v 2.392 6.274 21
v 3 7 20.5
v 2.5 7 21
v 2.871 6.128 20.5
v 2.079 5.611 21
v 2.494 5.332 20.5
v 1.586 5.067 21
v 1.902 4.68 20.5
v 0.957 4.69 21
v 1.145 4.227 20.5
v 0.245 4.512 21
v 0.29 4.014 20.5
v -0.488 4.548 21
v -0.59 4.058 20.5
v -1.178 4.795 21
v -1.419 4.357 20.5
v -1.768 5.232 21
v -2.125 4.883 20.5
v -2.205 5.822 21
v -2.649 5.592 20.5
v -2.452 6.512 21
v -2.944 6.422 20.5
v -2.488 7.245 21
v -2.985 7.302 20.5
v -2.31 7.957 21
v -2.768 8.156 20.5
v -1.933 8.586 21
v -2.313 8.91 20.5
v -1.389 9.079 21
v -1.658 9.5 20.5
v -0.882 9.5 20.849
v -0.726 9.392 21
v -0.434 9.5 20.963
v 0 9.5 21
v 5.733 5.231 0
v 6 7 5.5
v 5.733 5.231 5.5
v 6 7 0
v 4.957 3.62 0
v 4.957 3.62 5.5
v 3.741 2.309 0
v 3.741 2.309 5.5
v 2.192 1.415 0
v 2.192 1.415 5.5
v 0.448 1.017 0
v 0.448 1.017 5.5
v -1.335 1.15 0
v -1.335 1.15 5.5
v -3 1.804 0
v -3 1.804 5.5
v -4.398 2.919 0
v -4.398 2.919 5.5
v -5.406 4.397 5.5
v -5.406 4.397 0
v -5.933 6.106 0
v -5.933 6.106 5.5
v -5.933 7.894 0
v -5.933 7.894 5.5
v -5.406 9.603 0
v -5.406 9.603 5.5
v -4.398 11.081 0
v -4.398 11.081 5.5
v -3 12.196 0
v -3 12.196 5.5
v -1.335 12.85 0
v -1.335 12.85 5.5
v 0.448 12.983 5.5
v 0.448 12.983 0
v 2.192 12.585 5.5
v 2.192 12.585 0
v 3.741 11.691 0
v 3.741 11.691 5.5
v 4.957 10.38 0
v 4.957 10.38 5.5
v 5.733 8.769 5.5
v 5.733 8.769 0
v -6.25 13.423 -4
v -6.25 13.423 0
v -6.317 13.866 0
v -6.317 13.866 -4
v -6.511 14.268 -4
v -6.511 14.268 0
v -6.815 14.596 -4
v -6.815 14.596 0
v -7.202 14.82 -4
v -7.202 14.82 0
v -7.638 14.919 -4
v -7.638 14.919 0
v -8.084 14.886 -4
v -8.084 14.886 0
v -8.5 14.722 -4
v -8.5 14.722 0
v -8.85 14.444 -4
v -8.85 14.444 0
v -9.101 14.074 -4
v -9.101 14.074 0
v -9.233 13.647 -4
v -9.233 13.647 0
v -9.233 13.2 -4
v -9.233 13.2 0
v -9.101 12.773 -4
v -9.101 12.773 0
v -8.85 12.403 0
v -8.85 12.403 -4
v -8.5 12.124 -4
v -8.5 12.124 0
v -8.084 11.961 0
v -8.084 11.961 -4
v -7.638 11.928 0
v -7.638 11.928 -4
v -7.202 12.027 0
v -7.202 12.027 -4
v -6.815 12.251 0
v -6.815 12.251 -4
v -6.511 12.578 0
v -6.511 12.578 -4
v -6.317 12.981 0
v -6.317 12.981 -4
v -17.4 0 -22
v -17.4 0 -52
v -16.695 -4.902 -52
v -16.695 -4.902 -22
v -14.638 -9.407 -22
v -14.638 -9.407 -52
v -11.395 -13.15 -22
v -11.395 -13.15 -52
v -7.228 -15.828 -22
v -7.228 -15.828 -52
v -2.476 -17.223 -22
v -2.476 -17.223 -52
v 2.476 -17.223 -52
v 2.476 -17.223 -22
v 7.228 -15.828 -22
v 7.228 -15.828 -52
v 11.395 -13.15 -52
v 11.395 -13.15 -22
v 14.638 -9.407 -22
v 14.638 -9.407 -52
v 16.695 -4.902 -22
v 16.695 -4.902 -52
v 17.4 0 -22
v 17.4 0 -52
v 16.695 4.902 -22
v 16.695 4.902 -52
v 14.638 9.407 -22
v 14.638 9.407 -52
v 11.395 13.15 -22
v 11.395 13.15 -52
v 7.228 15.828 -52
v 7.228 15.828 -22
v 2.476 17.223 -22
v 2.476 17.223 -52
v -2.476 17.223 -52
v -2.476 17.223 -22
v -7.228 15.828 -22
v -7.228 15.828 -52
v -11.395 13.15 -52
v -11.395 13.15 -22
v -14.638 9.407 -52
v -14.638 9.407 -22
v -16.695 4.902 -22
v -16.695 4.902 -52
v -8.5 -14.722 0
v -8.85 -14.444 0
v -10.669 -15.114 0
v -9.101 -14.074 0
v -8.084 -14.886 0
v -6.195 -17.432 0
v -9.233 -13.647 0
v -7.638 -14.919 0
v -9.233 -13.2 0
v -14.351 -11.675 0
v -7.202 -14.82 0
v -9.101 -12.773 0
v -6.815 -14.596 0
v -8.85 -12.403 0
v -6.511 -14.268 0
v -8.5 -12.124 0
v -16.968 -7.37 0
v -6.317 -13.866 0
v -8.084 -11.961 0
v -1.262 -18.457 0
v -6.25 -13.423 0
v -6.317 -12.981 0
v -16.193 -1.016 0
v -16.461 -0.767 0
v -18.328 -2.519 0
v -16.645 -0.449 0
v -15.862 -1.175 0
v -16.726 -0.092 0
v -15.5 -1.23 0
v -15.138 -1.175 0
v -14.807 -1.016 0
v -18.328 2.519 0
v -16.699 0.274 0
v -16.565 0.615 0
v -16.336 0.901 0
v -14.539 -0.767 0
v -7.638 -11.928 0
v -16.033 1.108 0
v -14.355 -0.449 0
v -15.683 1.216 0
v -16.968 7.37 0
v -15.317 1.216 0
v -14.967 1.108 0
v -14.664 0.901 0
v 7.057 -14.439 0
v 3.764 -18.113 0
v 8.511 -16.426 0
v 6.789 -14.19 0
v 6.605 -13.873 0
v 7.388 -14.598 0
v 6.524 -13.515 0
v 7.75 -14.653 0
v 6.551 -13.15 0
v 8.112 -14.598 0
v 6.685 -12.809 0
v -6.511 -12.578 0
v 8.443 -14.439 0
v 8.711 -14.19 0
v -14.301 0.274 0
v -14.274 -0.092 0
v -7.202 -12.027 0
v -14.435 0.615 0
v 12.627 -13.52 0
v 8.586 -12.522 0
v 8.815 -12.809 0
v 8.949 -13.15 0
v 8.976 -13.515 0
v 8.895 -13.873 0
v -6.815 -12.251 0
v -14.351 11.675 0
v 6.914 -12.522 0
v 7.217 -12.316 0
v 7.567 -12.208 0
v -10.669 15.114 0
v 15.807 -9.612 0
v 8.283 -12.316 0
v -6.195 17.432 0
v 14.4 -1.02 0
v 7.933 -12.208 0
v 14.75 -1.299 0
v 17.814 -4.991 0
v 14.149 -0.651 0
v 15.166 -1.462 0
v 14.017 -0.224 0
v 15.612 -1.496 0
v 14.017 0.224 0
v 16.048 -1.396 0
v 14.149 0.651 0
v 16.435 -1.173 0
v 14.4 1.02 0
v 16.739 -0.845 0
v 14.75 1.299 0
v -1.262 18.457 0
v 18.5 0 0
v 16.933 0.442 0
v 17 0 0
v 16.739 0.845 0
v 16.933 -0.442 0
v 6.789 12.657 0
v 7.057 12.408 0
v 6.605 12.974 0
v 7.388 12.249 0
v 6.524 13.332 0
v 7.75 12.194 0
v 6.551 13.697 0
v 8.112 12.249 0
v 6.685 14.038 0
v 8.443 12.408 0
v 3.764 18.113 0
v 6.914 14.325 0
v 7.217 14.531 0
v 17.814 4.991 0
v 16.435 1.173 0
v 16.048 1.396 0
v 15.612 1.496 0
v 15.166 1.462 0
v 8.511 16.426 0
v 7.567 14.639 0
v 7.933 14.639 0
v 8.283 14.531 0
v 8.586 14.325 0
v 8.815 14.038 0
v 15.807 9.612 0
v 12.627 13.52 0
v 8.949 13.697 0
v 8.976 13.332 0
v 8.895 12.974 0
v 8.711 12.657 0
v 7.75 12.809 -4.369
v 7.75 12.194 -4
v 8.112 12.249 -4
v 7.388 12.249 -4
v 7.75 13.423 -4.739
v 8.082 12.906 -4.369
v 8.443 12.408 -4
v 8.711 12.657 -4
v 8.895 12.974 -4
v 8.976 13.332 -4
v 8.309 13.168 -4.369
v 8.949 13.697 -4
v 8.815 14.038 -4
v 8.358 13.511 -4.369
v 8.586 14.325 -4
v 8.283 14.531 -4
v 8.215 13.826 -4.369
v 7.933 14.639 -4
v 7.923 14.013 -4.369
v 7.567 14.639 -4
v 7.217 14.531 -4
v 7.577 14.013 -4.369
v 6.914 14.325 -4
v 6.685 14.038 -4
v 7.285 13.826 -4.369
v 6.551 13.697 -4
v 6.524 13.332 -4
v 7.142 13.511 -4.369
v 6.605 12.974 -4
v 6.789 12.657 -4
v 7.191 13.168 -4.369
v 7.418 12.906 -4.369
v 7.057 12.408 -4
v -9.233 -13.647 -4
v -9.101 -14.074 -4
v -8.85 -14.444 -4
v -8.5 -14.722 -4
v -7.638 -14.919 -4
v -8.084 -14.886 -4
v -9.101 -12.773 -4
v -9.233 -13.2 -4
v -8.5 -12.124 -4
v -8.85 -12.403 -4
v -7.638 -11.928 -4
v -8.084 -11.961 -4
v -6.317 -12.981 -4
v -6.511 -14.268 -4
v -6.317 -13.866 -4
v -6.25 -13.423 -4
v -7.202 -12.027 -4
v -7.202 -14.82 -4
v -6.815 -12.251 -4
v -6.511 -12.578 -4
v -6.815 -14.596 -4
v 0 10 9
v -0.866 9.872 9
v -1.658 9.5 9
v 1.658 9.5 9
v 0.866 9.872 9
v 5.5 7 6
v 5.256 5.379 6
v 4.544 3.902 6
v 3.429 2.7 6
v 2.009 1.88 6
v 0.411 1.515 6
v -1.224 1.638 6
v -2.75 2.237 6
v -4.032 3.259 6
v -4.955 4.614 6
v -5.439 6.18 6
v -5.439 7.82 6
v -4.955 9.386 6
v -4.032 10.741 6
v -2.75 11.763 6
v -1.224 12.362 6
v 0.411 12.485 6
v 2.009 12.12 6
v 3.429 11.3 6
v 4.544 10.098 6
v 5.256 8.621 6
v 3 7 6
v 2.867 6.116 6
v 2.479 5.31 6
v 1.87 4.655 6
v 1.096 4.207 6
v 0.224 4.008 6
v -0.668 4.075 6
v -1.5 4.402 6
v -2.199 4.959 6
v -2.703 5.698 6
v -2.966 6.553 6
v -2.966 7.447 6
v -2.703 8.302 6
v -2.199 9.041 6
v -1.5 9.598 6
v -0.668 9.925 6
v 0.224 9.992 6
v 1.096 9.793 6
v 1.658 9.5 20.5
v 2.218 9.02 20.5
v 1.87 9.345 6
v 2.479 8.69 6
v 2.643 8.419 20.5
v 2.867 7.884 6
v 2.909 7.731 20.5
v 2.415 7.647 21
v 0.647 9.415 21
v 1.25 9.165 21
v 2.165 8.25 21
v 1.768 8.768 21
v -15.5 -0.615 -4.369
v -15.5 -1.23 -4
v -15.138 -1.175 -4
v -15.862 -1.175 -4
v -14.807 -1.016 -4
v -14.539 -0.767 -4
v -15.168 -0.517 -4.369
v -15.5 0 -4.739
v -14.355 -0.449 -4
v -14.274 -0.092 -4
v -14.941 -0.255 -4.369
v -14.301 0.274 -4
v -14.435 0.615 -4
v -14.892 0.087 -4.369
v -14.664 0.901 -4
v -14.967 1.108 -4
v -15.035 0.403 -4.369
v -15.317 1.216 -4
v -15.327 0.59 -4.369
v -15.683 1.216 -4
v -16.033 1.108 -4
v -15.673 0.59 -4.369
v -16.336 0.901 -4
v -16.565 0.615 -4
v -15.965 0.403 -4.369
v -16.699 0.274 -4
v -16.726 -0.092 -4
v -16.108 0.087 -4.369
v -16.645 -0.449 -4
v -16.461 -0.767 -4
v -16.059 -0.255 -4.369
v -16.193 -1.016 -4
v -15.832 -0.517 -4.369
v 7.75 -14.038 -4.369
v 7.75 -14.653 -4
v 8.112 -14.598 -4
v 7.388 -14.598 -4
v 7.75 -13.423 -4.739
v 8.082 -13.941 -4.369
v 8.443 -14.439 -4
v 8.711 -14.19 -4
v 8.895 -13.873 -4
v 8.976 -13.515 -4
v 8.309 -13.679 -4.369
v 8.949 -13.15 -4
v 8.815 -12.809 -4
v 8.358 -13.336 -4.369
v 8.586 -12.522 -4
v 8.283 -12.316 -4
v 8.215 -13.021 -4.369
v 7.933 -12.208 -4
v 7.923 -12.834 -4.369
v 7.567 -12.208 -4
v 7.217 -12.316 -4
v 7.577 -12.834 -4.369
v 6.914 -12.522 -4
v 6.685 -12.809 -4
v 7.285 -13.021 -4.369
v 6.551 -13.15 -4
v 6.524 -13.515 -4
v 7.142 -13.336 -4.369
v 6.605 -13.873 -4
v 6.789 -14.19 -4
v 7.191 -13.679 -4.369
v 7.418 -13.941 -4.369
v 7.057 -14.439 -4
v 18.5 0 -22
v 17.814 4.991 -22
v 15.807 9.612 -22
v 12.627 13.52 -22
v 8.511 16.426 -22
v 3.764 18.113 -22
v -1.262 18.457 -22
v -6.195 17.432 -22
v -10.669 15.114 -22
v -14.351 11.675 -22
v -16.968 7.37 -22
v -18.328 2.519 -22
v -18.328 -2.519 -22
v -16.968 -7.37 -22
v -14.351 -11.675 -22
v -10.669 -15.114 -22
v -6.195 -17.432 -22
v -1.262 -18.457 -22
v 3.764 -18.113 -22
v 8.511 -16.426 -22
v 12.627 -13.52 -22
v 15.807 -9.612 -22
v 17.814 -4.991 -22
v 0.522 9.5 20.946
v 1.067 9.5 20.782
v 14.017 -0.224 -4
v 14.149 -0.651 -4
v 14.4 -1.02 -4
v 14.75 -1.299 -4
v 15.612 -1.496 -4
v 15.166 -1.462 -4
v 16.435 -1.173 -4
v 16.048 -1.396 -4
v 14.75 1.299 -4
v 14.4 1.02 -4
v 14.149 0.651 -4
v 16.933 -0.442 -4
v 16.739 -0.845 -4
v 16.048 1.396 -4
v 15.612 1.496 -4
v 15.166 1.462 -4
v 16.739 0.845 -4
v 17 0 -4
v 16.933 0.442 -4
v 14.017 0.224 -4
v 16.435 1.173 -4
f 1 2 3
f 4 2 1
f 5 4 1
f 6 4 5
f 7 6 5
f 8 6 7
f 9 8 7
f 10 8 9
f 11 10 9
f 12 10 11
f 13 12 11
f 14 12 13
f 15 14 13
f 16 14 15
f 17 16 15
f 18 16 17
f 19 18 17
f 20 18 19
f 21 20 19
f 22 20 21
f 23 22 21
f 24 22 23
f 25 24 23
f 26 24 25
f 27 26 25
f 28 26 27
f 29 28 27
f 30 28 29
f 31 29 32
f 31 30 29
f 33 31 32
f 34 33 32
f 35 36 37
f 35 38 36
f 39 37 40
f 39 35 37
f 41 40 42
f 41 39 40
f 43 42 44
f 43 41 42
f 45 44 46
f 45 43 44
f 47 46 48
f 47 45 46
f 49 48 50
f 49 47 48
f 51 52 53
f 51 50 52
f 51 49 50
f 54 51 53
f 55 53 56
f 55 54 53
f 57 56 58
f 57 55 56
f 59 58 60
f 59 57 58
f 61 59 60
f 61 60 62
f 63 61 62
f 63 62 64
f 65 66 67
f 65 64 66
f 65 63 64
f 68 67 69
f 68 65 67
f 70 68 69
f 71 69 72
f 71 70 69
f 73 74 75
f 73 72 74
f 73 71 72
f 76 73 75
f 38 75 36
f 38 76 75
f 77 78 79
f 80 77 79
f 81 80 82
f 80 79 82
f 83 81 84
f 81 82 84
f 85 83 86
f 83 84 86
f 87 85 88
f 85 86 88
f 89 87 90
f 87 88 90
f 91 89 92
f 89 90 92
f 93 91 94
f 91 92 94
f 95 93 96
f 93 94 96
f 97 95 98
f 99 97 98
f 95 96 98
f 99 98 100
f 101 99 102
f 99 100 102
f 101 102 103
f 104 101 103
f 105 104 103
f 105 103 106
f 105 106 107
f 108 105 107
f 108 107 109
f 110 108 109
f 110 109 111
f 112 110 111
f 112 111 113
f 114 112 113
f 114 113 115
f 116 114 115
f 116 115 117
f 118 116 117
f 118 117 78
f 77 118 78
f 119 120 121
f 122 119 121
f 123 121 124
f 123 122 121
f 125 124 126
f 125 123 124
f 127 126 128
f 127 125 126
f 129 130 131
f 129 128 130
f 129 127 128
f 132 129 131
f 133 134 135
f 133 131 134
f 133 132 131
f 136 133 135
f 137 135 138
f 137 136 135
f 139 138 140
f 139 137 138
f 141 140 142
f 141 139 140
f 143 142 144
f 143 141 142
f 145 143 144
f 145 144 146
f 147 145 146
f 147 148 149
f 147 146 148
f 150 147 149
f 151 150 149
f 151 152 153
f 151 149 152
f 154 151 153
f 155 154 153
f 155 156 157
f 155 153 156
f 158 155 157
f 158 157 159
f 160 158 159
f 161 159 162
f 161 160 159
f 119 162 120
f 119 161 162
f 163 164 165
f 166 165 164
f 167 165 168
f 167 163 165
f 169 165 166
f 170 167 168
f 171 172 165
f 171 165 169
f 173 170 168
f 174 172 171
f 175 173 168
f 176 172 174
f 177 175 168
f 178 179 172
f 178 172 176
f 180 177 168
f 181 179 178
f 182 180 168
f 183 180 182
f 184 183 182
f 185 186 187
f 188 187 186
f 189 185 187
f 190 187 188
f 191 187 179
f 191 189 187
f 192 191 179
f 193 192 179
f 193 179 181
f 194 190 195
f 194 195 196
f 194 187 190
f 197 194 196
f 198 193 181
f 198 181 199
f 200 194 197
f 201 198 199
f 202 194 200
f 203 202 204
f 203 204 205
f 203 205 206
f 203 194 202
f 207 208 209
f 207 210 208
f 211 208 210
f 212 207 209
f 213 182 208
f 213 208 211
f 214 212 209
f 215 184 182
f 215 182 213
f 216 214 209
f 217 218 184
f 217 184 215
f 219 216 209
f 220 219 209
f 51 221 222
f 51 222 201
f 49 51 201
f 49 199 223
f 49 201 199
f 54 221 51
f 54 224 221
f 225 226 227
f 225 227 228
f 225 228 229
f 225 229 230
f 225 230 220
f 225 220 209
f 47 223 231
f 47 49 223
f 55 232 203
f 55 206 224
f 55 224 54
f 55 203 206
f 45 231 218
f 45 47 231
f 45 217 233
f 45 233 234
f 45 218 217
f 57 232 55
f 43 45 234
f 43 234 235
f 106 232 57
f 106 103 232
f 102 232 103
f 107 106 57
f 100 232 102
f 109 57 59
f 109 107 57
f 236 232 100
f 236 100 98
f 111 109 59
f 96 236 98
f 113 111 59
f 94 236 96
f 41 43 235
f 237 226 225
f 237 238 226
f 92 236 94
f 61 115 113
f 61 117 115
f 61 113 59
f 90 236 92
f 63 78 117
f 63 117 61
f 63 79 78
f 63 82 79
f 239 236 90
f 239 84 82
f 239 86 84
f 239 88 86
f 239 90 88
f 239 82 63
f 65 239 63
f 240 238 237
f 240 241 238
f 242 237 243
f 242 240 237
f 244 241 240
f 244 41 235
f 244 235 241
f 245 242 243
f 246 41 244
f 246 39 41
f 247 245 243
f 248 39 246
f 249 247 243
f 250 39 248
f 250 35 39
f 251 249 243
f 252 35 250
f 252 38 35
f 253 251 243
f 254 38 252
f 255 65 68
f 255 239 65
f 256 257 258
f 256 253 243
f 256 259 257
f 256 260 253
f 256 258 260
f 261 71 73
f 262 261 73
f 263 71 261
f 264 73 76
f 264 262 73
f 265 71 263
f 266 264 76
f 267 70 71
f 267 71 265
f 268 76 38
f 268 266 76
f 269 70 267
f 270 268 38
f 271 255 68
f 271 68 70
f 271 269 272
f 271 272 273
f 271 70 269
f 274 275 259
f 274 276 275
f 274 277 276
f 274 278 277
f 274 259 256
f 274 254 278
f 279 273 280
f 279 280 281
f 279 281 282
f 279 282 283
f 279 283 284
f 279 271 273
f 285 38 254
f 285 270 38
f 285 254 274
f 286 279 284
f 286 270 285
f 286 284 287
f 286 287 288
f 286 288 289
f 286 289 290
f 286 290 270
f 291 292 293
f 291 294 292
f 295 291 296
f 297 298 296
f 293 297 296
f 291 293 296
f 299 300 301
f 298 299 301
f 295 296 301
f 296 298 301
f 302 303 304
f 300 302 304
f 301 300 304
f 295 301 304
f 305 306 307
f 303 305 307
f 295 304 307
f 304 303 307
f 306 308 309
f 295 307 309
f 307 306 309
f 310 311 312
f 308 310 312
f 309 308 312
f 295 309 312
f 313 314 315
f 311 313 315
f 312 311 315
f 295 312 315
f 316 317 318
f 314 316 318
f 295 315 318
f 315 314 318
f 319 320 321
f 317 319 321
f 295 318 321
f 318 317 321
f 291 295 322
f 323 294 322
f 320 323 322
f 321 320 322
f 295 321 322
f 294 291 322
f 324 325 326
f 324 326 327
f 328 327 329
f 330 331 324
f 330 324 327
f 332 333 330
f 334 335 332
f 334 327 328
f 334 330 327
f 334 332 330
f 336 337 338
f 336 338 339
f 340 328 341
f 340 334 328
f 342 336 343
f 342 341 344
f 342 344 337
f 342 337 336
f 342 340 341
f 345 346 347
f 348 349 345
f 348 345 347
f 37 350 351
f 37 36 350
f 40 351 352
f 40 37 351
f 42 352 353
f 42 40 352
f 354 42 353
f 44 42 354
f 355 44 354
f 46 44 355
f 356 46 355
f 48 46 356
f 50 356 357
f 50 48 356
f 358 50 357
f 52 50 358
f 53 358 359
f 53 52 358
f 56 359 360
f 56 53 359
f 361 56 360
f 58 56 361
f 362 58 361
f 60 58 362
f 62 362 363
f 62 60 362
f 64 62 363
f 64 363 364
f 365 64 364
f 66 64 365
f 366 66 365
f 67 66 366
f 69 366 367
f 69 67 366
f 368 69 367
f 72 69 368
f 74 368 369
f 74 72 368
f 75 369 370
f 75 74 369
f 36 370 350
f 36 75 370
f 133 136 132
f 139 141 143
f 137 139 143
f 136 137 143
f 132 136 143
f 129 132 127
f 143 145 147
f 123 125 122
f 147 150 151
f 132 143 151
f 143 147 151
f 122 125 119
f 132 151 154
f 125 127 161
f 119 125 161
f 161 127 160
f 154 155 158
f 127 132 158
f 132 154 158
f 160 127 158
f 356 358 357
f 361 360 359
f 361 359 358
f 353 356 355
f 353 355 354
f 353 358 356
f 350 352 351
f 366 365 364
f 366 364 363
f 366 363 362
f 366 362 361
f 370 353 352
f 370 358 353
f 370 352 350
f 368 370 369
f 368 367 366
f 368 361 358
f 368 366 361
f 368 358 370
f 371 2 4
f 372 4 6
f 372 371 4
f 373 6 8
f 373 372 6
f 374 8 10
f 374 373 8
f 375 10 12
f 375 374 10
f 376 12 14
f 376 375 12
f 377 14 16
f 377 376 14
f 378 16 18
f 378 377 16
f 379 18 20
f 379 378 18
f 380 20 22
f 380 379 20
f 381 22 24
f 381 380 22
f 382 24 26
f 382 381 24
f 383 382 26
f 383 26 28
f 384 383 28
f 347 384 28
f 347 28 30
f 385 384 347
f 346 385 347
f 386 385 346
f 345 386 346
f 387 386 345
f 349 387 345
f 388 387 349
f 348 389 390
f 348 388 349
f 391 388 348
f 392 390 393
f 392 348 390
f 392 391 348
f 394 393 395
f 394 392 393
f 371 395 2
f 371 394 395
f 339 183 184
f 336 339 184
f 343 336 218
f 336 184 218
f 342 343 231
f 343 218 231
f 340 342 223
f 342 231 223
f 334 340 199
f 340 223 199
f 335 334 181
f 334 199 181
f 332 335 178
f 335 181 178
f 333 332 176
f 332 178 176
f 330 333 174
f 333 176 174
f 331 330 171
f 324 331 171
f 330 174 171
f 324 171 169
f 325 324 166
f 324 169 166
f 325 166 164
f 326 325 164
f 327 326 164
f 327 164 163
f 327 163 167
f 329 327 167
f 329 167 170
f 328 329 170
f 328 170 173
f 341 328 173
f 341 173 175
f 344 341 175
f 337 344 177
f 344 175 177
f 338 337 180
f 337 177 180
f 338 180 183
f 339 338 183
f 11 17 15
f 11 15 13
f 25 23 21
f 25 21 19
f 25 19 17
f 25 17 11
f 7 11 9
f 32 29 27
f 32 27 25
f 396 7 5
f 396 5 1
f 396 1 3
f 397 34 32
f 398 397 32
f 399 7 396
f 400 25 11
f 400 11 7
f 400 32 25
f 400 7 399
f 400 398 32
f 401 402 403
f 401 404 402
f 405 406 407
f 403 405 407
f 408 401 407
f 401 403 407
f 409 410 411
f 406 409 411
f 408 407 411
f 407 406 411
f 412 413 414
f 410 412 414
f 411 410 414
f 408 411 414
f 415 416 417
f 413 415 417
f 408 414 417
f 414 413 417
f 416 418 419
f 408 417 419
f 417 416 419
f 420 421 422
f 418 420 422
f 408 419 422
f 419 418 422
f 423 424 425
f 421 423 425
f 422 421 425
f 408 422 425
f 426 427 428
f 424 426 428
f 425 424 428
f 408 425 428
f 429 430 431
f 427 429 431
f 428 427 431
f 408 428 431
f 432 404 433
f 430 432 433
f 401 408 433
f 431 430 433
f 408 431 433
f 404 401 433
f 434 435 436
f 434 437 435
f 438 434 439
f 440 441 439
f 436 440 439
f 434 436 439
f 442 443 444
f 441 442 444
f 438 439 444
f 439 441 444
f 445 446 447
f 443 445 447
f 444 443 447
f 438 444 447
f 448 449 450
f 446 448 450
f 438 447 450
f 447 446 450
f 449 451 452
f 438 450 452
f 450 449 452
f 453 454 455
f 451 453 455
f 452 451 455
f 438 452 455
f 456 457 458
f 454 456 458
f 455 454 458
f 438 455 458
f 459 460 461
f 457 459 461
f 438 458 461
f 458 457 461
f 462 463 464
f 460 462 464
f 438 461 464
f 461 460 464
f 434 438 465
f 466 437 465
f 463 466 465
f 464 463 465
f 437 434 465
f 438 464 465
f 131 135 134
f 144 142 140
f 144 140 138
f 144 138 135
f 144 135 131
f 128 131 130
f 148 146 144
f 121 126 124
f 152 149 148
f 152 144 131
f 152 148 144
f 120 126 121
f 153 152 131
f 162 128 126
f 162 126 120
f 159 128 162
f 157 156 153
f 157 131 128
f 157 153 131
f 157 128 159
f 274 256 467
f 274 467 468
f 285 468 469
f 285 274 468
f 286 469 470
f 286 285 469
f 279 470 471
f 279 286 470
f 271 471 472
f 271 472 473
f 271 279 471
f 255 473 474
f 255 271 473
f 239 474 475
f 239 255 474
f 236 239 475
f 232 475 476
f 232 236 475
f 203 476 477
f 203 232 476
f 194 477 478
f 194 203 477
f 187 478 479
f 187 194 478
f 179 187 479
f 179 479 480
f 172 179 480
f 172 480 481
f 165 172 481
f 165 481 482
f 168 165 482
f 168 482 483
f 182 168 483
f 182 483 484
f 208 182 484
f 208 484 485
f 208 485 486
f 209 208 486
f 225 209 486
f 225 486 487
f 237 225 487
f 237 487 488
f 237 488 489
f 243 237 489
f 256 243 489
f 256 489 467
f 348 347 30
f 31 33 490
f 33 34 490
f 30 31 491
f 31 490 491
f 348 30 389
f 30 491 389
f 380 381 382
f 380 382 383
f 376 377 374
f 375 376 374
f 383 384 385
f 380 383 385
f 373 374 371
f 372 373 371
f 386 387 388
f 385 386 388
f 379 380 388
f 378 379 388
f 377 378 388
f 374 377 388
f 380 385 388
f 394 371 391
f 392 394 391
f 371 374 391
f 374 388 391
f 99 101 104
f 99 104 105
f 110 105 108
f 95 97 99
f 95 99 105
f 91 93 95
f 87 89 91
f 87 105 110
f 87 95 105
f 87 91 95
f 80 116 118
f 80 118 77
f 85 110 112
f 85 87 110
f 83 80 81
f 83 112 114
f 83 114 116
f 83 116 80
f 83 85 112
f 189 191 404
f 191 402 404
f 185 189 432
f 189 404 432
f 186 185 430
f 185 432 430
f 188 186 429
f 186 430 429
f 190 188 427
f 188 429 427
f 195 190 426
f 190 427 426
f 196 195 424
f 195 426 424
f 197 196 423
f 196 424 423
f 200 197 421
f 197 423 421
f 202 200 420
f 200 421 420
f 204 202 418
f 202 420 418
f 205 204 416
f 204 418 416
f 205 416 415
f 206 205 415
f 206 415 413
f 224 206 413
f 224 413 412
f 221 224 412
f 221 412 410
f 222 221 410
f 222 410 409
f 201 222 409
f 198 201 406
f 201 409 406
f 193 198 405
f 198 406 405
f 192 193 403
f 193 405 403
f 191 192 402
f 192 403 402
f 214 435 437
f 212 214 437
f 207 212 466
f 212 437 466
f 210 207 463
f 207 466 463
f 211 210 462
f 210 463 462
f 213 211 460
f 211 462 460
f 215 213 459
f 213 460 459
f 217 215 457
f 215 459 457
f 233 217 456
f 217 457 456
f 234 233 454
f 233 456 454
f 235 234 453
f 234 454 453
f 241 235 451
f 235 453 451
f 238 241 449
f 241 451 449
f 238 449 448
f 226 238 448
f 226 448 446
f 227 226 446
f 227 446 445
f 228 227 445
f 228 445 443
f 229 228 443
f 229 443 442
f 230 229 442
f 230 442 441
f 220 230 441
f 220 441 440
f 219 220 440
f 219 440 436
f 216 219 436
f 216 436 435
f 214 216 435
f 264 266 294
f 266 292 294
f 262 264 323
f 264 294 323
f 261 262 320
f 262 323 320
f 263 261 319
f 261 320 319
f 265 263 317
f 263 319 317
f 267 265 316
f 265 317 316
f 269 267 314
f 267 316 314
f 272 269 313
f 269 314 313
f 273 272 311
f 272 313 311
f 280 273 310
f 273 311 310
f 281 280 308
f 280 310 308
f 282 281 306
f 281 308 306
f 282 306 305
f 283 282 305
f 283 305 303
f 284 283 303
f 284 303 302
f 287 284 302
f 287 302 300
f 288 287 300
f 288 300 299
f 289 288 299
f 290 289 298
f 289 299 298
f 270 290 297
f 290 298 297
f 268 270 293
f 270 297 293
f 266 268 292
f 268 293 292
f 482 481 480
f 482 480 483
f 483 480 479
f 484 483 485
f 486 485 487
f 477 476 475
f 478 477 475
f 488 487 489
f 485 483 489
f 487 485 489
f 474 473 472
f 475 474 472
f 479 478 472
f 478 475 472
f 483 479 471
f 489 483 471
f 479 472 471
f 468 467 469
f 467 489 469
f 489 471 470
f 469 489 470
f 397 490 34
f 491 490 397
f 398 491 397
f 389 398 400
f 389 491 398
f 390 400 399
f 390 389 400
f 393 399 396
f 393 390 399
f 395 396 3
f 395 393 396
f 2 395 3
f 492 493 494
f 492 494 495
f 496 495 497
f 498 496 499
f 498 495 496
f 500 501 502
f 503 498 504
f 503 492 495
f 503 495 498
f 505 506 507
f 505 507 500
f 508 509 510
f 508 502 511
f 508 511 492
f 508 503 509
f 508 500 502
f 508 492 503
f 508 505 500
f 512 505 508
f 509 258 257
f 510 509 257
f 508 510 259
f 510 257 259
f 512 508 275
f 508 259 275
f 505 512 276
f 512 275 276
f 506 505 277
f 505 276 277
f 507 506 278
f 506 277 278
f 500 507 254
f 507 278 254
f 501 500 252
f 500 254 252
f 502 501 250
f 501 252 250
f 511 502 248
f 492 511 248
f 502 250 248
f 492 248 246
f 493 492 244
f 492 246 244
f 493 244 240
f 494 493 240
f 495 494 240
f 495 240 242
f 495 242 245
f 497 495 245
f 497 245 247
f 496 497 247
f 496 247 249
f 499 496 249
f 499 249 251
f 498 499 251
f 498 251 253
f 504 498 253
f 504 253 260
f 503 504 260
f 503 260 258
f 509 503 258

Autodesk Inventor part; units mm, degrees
ref_plane "YZ Plane" through (0, 0, 0) normal (1, 0, 0) x (0, 1, 0)
ref_plane "XZ Plane" through (0, 0, 0) normal (0, 1, 0) x (-1, 0, 0)
ref_plane "XY Plane" through (0, 0, 0) normal (0, 0, 1) x (1, 0, 0)
sketch "Skizze1" plane through (0, 0, 0) normal (0, 0, 1) x (1, 0, 0)
  circle A0 centre (7.75, -13.4234) radius 1.5
  circle A1 centre (-7.75, -13.4234) radius 1.5
  circle A2 centre (-13.4234, 7.75) radius 1.5
  circle A3 centre (13.4234, 7.75) radius 1.5
  circle A4 centre (-7.75, 13.4234) radius 1.5
  circle A5 centre (15.5, 0) radius 1.5
  circle A6 centre (7.75, 13.4234) radius 1.5
  circle A7 centre (0, -15.5) radius 1.5
  circle A8 centre (-15.5, 0) radius 1.5
  circle A9 centre (0, 7) radius 6
  circle A10 centre (0, 0) radius 18.5
extrude "Extrusion1" add sketch "Skizze1" along normal blind 6 contours A9
extrude "Extrusion2" add sketch "Skizze1" against normal blind 22 contours A0 | A1 | A2 | A3 | A4 | A5 | A6 | A7 | A8 | A9 | A10
sketch "Skizze2" plane through (0, 0, -22) normal (0, 0, -1) x (-1, 0, 0)
  circle A0 centre (0, 0) radius 18.5 projected
  circle A1 centre (0, 0) radius 17.4
  dimension "d4" = 34.8
extrude "Extrusion3" add sketch "Skizze2" along normal blind 30 separate body contours A1
chamfer "Fase1" distance 0.5 angle 45 1 edges at (-6, 7, 6)
sketch "Skizze3" plane through (0, 7, 6) normal (0, 0, 1) x (1, 0, 0)
  circle A0 centre (0, 0) radius 5.5 projected
  circle A1 centre (0, 0) radius 3
  point P0 (0, -7)
  dimension "d10" = 6
extrude "Extrusion4" add sketch "Skizze3" along normal blind 15 separate body contours A1
chamfer "Fase2" distance 0.5 angle 45 1 edges at (-3, 7, 21)
extrude "Extrusion5" cut sketch "Skizze1" against normal blind 4 contours A1 | A4 | A5 bodies 1
hole "Bohrung1" at (-15.5, 0, 0) at (7.75, -13.4234, 0) at (7.75, 13.4234, 0) direction (0, 0, -1) diameter 2.459 depth 4 tip angle 118 bodies 1 thread size "M3x0.5" class "6H" standard "ANSI Metric M Profile"
sketch "Skizze4" plane through (0, 7, 21) normal (0, 0, 1) x (1, 0, 0)
  circle A0 centre (0, 0) radius 2.5 projected
  circle A1 centre (0, 0) radius 3 projected
  line L0 (-1.6583, 2.5) -> (1.6583, 2.5)
  point P0 (0, -7)
  dimension "d25" = 5.5
extrude "Extrusion6" cut sketch "Skizze4" against normal blind 12 contours L0 A1 picked at (-0.897, 2.6056) bodies 3
properties part number "conrad_getriebe_motor" material "Stahl"
